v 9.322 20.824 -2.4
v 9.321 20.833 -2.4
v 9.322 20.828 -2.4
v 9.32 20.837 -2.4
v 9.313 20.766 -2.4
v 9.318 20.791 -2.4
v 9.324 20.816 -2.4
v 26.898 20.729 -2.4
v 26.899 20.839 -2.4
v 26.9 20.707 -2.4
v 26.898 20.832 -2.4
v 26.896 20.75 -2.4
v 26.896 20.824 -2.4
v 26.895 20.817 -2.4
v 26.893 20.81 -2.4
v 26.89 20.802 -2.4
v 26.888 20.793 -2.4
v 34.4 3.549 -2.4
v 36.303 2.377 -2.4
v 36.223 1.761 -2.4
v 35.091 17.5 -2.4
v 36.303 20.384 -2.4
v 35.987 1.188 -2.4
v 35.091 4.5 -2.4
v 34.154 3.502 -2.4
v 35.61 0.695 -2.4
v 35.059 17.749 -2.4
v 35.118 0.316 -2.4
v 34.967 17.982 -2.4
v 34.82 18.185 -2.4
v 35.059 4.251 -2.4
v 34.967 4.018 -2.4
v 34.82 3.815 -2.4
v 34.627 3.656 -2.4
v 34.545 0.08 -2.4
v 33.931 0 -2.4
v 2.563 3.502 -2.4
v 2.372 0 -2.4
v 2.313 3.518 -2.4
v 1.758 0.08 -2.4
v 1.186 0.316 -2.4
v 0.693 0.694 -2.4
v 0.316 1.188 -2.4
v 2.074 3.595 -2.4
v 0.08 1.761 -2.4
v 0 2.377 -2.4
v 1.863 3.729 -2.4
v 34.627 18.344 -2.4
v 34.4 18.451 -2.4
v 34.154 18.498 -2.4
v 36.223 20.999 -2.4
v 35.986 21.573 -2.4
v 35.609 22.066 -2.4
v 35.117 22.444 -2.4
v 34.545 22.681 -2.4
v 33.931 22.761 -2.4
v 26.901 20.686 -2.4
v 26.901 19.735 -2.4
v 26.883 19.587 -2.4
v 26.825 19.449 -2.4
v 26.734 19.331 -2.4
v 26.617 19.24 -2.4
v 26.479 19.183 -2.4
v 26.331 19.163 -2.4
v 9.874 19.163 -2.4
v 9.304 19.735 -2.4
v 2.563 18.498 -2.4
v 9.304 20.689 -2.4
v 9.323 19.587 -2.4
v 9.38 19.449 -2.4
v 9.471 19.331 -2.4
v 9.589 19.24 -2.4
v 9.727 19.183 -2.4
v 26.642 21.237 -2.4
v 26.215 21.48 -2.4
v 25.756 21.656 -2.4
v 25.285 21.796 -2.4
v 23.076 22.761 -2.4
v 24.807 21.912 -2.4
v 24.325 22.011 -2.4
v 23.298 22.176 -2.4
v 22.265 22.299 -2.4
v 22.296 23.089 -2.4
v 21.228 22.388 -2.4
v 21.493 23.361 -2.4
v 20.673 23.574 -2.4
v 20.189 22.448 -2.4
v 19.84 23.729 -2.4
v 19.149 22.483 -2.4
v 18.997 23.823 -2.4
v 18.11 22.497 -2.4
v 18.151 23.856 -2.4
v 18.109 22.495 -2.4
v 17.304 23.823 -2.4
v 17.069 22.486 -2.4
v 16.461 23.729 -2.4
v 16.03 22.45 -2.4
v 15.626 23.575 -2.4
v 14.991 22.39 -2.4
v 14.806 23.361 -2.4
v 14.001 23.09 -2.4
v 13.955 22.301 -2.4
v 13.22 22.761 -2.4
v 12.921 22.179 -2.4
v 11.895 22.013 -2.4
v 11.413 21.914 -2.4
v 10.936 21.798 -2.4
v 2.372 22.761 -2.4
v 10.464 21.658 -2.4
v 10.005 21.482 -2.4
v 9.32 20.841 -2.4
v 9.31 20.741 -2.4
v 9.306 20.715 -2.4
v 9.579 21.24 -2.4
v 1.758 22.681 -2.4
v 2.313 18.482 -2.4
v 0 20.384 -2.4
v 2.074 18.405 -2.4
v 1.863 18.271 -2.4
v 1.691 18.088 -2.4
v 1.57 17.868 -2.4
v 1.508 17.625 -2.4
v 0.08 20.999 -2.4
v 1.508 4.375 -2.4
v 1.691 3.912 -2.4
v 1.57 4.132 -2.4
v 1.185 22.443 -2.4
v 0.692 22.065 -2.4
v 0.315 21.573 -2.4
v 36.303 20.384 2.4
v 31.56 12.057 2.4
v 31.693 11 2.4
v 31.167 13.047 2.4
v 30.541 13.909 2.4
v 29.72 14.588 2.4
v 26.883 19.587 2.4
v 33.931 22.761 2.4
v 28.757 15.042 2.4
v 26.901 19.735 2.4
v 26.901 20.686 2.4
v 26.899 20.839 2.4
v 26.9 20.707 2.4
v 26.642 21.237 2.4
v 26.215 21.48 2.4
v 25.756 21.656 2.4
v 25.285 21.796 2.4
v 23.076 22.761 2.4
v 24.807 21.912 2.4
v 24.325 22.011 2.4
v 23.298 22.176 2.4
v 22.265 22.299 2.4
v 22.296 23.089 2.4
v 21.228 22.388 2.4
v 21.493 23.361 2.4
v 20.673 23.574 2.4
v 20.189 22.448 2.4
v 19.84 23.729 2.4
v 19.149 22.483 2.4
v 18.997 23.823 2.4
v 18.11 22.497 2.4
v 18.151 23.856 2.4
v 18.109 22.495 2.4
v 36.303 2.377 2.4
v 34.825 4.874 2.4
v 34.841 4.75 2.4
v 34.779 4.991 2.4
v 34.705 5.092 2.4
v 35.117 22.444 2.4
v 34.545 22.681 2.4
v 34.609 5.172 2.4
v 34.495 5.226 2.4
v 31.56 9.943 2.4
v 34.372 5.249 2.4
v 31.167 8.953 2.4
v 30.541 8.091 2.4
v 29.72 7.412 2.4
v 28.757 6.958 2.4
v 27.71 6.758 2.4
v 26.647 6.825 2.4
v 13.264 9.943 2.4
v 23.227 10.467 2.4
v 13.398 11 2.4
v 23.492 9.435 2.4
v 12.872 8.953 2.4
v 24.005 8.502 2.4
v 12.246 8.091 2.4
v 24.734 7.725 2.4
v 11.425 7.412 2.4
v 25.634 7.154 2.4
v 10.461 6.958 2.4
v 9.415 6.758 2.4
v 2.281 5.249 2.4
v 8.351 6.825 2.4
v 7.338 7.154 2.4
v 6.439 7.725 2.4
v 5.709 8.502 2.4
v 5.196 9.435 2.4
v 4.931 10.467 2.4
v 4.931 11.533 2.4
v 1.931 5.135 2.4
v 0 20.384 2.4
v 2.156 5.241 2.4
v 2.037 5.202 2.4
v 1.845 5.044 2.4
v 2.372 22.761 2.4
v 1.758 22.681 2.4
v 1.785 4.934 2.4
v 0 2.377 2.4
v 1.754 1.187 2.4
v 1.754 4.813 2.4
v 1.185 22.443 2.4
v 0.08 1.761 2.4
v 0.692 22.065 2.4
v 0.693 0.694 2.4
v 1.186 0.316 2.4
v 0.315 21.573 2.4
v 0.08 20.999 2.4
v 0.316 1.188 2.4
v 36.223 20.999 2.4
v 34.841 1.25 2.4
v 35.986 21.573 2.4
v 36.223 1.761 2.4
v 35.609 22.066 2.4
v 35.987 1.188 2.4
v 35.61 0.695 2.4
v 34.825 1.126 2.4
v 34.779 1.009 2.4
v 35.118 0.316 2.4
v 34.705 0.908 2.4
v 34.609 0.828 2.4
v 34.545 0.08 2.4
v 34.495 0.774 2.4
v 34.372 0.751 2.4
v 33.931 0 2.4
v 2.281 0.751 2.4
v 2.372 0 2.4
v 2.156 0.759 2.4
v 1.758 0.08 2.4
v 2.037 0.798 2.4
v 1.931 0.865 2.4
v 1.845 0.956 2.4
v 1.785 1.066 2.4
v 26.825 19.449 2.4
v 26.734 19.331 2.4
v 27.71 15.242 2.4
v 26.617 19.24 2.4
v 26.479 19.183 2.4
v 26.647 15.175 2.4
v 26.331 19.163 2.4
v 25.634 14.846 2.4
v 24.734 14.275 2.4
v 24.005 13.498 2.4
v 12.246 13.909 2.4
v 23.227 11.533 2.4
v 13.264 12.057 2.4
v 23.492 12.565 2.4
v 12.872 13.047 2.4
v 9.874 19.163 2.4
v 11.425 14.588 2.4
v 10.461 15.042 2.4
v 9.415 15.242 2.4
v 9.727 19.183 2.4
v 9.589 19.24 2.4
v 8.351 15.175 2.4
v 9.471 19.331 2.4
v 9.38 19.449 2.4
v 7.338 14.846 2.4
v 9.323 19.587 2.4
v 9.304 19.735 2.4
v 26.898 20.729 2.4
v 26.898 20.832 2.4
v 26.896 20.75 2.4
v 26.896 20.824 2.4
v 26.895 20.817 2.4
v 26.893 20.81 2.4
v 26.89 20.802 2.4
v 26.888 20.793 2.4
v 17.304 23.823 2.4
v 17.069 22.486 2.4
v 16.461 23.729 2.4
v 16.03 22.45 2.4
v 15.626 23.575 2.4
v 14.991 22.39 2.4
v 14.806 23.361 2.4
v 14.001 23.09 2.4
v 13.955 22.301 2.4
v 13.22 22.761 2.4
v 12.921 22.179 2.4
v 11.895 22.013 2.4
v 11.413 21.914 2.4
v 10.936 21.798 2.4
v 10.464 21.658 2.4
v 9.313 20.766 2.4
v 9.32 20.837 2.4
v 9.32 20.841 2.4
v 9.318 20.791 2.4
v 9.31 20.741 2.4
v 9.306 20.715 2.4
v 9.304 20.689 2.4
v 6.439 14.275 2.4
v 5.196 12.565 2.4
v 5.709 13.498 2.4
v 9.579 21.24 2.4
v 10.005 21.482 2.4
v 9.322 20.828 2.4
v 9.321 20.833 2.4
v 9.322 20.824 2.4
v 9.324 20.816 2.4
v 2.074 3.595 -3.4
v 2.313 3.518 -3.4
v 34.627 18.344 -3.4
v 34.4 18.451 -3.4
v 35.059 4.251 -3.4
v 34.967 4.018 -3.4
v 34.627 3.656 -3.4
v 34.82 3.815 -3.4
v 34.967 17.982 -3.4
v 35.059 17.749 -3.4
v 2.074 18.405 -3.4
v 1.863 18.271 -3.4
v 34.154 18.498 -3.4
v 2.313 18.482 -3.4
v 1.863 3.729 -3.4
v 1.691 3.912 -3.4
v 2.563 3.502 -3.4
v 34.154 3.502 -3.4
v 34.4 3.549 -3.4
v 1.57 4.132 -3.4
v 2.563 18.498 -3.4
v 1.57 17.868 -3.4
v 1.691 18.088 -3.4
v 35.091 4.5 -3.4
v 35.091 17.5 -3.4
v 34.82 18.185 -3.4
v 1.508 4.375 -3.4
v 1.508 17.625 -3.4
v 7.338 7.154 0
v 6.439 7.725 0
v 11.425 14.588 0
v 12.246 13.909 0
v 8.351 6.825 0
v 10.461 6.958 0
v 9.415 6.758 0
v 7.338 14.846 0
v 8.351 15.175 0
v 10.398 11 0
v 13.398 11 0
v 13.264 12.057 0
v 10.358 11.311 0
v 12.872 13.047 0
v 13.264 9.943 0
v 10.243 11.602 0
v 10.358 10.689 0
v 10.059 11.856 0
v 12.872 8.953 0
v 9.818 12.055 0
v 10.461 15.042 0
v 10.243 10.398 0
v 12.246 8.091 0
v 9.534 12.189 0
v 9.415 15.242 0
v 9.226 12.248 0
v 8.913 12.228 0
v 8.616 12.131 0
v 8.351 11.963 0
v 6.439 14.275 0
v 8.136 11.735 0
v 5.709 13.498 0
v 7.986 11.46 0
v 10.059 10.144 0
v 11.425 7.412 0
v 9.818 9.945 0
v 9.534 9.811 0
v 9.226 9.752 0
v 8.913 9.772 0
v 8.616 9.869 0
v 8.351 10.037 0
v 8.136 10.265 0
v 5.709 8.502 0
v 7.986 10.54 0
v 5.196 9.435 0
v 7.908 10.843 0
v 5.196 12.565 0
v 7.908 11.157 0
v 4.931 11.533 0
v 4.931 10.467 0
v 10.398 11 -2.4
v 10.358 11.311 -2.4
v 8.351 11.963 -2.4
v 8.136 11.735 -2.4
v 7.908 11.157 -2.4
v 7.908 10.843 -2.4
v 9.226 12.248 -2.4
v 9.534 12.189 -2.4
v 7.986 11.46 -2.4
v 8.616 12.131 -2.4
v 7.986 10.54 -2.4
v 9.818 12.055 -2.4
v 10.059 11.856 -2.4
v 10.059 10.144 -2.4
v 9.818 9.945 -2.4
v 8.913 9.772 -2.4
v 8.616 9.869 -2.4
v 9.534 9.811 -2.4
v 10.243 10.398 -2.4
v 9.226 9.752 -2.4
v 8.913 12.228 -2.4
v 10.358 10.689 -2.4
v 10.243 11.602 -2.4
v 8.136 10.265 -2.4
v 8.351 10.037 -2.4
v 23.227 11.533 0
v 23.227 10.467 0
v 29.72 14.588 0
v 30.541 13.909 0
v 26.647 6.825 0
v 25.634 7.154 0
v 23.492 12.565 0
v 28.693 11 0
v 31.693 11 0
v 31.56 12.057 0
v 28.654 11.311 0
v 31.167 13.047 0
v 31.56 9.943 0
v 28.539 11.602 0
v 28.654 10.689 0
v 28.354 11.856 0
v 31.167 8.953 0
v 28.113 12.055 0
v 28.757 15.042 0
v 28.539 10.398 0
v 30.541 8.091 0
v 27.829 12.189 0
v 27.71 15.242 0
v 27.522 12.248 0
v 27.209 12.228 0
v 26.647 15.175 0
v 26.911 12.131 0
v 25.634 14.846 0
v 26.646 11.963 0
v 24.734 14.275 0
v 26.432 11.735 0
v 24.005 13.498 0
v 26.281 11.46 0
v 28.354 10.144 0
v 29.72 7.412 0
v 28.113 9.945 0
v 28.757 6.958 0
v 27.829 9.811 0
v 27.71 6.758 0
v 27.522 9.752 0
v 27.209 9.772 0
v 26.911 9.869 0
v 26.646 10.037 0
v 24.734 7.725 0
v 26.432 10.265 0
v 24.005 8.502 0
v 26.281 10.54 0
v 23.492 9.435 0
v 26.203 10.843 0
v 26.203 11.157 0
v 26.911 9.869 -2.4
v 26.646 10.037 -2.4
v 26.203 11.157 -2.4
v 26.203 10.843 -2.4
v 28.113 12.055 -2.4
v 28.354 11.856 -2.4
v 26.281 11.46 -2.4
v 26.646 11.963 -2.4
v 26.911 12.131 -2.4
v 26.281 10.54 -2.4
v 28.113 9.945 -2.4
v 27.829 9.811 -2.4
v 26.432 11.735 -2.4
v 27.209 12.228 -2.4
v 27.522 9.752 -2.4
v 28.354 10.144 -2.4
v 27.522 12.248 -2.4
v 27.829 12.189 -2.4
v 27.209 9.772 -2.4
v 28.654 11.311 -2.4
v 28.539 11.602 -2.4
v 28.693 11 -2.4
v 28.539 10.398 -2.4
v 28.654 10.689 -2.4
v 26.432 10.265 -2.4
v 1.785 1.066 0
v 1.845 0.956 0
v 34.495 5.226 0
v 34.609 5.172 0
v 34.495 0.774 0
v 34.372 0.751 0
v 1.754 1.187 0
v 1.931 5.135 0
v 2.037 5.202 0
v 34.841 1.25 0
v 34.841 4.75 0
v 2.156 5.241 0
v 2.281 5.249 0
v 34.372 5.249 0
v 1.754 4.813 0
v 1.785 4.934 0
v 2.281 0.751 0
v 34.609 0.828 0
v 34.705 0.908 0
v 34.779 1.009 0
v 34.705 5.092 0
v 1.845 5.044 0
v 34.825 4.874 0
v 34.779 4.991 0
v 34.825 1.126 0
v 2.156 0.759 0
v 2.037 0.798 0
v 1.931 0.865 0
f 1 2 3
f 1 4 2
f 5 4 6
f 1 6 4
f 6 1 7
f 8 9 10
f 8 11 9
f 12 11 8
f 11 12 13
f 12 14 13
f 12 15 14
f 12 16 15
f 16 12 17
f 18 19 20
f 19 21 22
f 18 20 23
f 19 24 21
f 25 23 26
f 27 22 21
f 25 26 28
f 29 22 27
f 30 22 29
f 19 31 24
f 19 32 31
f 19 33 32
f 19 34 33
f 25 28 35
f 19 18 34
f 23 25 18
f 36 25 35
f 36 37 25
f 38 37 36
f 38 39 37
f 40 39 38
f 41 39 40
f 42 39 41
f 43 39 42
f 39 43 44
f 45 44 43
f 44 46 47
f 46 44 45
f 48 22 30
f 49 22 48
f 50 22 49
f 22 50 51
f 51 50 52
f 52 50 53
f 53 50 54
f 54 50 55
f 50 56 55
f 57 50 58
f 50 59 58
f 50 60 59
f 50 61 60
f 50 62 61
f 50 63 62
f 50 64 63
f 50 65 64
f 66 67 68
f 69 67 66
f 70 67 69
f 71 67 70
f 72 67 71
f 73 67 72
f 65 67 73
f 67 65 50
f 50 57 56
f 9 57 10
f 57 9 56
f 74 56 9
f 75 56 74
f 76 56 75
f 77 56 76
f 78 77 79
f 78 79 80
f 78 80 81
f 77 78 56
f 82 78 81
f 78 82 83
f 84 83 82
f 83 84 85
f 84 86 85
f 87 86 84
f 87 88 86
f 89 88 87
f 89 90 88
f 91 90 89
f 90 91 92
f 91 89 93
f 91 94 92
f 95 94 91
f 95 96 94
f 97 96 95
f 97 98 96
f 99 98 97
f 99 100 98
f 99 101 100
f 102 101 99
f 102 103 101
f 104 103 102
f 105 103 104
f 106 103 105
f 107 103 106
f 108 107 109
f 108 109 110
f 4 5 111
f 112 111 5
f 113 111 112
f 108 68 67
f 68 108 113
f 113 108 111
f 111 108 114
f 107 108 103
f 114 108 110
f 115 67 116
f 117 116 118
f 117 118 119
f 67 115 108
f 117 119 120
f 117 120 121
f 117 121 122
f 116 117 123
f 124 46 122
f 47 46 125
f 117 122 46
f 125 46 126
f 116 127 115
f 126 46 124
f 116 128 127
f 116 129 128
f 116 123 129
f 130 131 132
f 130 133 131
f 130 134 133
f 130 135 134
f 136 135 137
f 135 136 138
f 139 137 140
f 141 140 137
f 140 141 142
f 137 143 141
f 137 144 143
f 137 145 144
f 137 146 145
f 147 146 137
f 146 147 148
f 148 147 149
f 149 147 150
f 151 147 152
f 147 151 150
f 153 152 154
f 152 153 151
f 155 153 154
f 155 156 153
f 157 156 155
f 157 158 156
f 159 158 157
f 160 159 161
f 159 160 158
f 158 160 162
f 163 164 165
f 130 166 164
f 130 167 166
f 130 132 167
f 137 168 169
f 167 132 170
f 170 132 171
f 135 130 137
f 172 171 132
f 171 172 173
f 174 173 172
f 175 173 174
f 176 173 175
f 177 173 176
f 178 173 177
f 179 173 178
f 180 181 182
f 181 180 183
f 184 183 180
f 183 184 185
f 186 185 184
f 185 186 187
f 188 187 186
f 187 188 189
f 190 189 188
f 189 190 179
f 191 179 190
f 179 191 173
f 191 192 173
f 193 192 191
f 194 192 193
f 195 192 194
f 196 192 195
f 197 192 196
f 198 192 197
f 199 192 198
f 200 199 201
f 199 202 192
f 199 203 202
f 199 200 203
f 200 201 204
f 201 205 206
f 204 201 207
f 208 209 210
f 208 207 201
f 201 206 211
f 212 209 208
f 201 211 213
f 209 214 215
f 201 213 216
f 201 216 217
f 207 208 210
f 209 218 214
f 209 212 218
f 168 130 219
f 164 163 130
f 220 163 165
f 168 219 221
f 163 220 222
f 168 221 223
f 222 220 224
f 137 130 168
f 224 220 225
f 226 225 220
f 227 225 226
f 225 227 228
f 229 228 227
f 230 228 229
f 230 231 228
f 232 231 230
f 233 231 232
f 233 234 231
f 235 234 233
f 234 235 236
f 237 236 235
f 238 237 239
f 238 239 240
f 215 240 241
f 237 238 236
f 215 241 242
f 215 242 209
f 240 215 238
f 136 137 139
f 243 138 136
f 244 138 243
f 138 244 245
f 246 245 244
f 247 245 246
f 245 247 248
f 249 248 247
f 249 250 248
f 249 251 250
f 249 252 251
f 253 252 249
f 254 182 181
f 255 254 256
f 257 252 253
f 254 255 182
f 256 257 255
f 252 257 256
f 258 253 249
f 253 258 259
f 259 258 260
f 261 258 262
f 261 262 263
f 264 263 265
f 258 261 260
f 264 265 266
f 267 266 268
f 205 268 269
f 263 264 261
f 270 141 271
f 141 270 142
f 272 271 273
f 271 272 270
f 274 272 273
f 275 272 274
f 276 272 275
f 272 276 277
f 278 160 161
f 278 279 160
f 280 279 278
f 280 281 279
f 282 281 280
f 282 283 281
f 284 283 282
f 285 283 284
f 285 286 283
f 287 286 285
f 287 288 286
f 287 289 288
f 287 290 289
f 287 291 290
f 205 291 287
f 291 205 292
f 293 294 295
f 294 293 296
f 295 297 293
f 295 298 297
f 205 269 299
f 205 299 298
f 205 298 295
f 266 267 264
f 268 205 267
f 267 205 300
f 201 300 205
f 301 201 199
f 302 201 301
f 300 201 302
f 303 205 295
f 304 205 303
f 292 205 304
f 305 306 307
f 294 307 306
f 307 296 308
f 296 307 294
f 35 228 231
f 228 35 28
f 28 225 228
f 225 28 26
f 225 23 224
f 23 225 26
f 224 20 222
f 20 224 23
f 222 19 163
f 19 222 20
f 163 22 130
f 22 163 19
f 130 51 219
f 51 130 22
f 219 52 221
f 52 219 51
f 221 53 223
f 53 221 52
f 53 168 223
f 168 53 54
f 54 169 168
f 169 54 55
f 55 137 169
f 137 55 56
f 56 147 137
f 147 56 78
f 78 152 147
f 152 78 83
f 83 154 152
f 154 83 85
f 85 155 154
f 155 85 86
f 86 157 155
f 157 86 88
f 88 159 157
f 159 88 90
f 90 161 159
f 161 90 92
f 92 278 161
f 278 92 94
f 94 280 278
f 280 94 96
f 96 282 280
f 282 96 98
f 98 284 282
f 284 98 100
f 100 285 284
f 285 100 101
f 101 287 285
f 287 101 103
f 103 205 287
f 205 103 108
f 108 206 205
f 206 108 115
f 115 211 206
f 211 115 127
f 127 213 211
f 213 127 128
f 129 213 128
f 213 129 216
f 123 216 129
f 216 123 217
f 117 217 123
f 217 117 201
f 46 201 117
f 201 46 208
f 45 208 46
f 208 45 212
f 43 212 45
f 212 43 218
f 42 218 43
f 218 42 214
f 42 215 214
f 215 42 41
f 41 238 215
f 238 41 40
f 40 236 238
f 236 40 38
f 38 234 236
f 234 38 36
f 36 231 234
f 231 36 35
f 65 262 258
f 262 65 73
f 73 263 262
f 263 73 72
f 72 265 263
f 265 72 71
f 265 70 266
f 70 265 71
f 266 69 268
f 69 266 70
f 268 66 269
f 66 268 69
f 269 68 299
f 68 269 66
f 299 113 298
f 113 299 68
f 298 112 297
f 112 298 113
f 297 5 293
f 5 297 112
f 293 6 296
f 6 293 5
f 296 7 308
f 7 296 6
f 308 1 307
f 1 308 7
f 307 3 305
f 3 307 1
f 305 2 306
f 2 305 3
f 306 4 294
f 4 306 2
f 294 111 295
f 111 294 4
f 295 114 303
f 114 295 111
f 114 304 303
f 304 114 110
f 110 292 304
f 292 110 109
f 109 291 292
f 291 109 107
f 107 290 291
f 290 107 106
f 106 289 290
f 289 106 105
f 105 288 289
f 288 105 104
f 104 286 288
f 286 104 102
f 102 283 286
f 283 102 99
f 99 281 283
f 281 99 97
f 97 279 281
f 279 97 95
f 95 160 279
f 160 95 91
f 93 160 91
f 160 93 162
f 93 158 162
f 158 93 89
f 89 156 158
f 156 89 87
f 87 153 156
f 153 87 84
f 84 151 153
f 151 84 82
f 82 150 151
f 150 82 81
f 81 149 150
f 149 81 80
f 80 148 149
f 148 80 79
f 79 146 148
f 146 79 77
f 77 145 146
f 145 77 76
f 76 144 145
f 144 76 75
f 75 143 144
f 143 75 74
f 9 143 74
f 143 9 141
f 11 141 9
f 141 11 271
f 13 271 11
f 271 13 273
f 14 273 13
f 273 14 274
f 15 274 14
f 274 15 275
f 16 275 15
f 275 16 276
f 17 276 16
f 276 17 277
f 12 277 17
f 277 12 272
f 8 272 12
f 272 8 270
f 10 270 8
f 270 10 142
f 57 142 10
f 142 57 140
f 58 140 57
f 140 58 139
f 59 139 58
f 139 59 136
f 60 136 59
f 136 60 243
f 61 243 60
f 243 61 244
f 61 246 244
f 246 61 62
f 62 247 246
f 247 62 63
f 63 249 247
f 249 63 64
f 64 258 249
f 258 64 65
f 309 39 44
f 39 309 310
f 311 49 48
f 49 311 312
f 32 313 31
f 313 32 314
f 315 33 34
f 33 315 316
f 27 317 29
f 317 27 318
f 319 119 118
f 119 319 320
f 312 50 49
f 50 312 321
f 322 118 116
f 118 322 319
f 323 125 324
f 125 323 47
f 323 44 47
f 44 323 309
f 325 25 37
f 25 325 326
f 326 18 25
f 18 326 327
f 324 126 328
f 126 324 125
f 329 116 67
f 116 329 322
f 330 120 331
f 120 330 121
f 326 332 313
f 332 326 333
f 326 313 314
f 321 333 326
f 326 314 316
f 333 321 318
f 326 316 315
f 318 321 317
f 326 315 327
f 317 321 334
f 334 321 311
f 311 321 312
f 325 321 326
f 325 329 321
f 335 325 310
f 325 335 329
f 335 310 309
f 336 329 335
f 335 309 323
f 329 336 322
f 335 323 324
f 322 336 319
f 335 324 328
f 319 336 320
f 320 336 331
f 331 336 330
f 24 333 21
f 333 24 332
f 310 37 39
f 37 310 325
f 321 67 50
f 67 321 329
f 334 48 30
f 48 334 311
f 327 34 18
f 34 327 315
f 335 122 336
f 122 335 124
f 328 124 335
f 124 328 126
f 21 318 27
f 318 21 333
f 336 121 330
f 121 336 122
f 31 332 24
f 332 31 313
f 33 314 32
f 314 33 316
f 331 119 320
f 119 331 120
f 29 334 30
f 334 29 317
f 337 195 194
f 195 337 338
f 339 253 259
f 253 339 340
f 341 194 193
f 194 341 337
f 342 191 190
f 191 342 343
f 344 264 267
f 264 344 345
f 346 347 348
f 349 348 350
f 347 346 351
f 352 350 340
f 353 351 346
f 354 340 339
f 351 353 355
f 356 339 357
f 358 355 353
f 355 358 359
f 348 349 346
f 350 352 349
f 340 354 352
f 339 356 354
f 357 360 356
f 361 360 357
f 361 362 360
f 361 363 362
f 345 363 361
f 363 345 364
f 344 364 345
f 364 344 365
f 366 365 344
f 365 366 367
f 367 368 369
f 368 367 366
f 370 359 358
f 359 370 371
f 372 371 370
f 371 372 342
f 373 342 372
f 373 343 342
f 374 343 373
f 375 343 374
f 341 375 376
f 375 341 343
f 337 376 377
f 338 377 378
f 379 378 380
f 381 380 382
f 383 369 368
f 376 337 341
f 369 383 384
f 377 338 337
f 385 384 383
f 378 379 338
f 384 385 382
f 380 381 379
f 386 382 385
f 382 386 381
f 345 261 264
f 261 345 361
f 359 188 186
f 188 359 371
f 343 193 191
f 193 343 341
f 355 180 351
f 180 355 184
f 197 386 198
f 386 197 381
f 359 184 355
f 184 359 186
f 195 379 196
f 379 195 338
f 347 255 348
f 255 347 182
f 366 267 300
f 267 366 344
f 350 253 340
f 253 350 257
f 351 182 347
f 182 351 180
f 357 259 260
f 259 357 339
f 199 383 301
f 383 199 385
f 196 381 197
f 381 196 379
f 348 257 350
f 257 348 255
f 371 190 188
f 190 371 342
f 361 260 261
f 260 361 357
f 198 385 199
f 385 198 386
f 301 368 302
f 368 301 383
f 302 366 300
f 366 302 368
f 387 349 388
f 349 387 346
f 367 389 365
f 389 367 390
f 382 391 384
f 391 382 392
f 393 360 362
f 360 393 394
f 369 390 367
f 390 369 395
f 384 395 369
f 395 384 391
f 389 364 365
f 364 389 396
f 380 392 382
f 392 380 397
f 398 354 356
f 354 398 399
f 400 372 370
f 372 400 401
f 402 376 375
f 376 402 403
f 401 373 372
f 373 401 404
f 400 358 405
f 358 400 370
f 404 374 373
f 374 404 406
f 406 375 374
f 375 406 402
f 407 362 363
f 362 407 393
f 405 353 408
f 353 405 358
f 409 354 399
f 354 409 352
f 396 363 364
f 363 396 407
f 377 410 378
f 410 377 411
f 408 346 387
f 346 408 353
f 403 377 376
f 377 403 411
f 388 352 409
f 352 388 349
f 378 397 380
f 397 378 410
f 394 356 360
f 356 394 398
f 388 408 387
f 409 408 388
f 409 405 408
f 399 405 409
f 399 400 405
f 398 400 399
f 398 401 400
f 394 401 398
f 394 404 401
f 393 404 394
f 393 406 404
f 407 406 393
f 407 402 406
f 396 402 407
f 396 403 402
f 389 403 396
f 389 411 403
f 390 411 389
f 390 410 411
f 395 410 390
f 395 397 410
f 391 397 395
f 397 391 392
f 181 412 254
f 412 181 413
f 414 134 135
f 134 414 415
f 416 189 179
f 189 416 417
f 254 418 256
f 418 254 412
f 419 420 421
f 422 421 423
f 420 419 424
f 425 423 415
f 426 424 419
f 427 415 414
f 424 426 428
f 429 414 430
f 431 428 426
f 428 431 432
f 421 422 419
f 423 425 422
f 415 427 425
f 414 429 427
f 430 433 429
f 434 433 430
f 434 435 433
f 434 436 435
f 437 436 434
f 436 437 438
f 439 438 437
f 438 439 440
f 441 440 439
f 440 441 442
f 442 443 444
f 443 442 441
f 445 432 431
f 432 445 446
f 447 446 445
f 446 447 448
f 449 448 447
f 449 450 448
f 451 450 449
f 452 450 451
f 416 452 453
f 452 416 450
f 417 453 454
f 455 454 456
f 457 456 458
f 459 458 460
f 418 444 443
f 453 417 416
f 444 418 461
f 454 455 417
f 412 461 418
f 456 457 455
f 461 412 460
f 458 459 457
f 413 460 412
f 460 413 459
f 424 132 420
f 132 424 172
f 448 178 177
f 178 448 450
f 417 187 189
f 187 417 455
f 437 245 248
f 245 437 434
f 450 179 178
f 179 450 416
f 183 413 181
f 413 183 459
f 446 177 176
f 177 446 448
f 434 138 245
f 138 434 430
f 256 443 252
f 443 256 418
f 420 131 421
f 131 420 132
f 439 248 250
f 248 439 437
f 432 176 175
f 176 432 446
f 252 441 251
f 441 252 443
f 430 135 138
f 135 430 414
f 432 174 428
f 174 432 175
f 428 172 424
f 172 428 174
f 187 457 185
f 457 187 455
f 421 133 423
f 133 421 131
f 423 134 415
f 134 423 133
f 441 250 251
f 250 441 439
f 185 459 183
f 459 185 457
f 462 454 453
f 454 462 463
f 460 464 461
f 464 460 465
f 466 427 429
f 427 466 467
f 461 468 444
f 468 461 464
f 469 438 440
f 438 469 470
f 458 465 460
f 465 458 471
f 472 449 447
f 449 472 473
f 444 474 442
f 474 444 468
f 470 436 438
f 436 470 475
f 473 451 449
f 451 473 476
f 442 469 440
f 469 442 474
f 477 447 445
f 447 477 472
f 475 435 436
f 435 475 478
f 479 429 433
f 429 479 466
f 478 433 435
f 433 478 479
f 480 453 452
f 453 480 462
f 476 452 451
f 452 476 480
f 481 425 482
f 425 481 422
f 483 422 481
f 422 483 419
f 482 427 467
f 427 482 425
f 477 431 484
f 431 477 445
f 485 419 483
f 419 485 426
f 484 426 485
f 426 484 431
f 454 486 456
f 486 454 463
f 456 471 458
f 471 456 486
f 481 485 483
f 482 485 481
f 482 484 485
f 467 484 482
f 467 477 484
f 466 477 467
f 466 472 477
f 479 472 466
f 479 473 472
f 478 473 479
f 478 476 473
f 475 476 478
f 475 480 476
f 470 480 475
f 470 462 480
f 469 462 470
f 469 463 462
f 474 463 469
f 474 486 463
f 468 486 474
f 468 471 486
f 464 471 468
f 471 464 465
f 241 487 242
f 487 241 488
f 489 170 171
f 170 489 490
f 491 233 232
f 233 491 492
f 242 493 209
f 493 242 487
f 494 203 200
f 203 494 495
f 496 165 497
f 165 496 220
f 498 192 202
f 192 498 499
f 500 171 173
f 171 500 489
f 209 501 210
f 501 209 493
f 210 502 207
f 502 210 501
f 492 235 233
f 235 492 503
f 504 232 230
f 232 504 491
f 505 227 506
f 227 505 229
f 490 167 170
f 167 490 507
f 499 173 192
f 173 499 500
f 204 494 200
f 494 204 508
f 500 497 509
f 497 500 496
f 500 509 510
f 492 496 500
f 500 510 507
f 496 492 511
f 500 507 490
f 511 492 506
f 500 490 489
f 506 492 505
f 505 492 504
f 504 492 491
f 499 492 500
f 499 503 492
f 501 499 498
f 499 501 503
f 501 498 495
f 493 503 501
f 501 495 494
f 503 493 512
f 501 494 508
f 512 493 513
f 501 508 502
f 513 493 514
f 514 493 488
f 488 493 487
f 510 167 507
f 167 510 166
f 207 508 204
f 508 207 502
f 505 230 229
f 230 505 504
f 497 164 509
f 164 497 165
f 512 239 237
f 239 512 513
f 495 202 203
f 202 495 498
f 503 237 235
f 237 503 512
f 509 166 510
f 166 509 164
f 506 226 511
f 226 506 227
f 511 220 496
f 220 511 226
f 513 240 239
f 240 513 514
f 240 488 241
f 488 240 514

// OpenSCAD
$fn=25;

HEIGHT=4.8;
WIDTH=35 * 23/22;
DEPTH=22; // ->23

module base() {
linear_extrude(center=true,height=HEIGHT) 
    import(file="wolfcraft.dxf",scale=WIDTH/100);

translate([WIDTH/2,DEPTH/2,-HEIGHT/2-1])
    roundedRect([WIDTH-4,14,1], 1);
}

module roundedRect(size, radius)
{
  x = size[0];
  y = size[1];
  z = size[2];

  linear_extrude(height=z)
  hull()
  {
    // place 4 circles in the corners, with the given radius
    translate([(-x/2)+(radius/2), (-y/2)+(radius/2), 0])
    circle(r=radius);

    translate([(x/2)-(radius/2), (-y/2)+(radius/2), 0])
    circle(r=radius);

    translate([(-x/2)+(radius/2), (y/2)-(radius/2), 0])
    circle(r=radius);

    translate([(x/2)-(radius/2), (y/2)-(radius/2), 0])
    circle(r=radius);
  }
}


difference() {
  base();
  translate([WIDTH/4,DEPTH/2,0]) linear_extrude(height=HEIGHT/2) circle(d=8.5);
  translate([WIDTH/4,DEPTH/2,-HEIGHT/2]) linear_extrude(height=HEIGHT/2) circle(d=2.5);
  translate([3*WIDTH/4,DEPTH/2,0]) linear_extrude(height=HEIGHT/2) circle(d=8.5);
  translate([3*WIDTH/4,DEPTH/2,-HEIGHT/2]) linear_extrude(height=HEIGHT/2) circle(d=2.5);
  translate([WIDTH/2, 3,0]) roundedRect([WIDTH - 4,4,HEIGHT/2],0.5);
}
